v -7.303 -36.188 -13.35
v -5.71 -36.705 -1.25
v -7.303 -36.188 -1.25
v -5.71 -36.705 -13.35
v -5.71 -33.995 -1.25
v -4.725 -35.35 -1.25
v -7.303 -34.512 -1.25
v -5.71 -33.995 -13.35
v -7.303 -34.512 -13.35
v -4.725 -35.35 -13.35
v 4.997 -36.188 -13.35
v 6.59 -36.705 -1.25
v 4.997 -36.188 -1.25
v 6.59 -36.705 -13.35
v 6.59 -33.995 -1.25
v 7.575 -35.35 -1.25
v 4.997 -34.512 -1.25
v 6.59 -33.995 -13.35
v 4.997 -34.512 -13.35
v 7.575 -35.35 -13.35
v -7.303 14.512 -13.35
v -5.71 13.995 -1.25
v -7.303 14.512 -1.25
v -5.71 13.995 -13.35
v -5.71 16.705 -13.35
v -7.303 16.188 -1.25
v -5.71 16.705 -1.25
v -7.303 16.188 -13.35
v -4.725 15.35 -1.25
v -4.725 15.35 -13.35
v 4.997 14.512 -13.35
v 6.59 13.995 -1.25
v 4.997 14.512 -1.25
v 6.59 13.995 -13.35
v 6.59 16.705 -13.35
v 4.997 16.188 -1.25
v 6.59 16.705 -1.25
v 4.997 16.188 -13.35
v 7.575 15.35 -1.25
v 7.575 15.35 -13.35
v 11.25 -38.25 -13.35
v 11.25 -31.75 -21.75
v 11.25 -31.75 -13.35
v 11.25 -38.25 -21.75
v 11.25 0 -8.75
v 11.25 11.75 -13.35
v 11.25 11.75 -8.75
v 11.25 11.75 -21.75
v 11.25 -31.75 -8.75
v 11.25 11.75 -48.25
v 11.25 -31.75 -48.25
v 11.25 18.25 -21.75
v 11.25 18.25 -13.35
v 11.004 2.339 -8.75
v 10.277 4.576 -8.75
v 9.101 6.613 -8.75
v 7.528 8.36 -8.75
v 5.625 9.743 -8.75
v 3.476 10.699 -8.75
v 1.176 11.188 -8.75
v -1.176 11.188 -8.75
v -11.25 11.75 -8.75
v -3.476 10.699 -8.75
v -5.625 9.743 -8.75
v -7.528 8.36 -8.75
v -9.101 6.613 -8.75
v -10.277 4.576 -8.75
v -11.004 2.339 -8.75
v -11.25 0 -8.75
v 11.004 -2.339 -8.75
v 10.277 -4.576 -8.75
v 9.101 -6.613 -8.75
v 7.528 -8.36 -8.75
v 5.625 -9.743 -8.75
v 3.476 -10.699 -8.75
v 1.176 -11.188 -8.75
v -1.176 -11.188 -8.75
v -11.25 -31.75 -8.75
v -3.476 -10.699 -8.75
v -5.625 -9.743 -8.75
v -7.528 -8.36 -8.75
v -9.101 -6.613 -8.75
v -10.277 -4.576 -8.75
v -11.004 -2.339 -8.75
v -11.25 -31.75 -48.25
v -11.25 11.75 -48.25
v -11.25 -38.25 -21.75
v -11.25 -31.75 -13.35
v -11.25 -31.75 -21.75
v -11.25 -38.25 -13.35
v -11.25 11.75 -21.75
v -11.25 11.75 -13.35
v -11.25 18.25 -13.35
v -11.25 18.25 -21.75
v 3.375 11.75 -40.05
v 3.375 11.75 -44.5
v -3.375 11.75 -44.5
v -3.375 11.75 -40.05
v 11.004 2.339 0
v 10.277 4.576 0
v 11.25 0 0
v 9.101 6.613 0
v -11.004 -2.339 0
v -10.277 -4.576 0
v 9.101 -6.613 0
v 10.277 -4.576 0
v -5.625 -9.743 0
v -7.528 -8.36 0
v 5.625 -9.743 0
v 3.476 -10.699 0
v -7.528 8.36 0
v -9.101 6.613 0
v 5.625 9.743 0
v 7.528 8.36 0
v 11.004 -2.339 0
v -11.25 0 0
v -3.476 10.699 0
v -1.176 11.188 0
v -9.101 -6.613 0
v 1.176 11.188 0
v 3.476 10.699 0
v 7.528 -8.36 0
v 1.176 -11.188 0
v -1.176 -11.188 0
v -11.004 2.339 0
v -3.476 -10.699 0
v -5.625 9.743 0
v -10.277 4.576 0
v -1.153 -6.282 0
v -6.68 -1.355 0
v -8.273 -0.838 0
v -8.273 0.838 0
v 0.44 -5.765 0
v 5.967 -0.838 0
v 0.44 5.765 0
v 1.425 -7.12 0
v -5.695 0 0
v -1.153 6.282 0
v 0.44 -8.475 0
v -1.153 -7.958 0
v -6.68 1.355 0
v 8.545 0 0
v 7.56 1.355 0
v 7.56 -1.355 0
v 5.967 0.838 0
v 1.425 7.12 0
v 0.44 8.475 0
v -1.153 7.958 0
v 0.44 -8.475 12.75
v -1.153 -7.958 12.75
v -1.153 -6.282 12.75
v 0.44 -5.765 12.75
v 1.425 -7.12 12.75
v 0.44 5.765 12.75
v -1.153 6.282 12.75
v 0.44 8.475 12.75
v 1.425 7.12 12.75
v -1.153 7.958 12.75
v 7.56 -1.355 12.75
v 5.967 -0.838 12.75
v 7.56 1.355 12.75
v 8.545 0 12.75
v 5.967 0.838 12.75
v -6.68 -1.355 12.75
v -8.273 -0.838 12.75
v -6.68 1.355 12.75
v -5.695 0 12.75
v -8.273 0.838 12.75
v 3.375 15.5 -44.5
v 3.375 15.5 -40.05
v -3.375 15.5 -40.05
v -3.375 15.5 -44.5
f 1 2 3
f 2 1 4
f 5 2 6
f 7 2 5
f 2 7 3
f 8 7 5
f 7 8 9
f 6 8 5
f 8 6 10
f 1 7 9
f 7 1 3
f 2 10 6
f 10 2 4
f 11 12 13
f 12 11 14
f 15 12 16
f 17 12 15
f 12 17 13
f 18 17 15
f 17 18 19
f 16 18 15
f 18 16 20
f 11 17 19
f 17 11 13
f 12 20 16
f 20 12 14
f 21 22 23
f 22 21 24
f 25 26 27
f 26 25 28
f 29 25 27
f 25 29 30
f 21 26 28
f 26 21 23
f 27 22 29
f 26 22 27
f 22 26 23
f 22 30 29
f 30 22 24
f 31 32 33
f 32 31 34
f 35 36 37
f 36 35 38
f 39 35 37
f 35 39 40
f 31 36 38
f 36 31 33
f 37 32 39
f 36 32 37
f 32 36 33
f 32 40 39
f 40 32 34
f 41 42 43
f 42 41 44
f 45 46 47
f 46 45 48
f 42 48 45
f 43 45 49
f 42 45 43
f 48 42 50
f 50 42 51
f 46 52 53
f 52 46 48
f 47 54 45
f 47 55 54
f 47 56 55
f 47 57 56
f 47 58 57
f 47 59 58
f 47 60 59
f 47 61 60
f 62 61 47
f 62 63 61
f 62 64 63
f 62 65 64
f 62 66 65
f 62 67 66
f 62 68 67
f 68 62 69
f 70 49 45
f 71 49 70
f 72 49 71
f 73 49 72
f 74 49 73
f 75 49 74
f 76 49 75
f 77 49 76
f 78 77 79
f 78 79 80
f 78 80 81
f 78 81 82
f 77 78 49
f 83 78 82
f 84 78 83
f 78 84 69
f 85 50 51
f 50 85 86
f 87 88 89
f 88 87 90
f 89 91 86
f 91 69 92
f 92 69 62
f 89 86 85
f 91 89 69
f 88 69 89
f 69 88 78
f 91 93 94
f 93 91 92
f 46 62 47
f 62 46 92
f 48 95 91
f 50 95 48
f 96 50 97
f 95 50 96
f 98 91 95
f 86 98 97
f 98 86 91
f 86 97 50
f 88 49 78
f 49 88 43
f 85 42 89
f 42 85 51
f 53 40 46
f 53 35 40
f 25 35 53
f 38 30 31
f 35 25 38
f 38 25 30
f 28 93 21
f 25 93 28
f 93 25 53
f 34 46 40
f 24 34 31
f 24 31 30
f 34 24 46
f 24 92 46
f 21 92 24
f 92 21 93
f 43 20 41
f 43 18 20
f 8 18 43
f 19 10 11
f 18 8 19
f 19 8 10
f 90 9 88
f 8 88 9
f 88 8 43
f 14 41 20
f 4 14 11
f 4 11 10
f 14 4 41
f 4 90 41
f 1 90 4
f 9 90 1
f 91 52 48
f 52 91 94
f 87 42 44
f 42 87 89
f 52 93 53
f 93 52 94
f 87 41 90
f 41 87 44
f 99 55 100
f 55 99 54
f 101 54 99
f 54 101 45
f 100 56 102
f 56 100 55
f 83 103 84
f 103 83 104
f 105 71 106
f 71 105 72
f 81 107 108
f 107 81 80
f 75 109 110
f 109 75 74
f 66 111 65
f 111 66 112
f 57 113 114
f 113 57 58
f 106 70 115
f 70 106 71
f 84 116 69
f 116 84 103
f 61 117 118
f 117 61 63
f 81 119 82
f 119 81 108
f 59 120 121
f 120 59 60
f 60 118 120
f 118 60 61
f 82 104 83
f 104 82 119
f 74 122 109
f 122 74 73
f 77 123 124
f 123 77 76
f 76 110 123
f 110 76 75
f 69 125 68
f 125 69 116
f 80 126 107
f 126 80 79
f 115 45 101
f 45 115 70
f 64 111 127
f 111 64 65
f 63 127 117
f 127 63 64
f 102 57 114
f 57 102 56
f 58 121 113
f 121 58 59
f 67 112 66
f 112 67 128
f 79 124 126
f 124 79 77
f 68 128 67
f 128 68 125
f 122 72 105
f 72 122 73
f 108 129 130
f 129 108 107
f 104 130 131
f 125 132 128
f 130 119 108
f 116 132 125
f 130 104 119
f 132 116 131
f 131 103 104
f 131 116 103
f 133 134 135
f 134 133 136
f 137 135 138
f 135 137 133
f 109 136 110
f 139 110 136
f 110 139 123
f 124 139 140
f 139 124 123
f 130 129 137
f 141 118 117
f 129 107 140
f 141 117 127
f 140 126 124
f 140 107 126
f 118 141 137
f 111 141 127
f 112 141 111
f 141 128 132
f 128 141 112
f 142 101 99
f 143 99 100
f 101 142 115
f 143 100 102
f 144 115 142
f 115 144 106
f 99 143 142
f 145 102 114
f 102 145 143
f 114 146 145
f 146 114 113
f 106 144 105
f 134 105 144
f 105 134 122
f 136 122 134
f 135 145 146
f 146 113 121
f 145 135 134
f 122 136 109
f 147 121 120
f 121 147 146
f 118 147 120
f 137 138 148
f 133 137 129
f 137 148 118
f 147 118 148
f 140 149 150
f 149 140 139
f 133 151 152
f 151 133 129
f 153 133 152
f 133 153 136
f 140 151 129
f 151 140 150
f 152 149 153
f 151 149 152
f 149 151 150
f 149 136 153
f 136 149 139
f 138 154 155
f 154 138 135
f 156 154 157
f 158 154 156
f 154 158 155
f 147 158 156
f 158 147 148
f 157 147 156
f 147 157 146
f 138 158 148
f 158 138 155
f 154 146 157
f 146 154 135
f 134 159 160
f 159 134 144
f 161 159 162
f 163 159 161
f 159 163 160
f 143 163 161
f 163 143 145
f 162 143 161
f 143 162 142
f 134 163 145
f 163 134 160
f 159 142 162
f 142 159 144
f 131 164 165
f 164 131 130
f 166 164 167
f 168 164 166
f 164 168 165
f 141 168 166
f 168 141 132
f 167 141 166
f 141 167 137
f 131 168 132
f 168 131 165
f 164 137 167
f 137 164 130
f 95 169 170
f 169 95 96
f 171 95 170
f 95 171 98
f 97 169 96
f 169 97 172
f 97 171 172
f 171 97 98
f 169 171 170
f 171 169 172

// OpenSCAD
//When calling this module, use toleranceMotor(boolean,boolean); The first boolean determines the bolt direction(true is up, false is down) and the second determines where the module is centered (true centers at the hub, false centers at the motor mount)



//basic motor shape
height=38;
length=42;
thickness=21;

//wings for mounting
wingsheight=5.5;
wingslength=55;
wingsdist=26.5;
boltheadheight=1.4;

//cylinder on top of motor
cylinderheight=(46-38);
cylinderdiam=21;
cylinderdist=31;

//all bolts
boltheight=13.5;
boltdiam=2.1;

//body bolts
boltdist=4.35;

//cylinder bolts
cylboltdist2=3.5;
cylboltdist=7.12;

//hub for wires
hubheight=3.7;
hubwidth=6;
hublength=3;
hubdist=3;

//THIS IS THE TOLERANCE, THIS IS PROBABLY THE ONLY THING YOU WILL NEED TO ADJUST, IF THE HOLES ARE TOO SMALL, RAISE TOLERANCE, IF THEY ARE TOO BIG, LOWER TOLERANCE. IF THE HOLES DON'T LINE UP, THEN START CHANGING OTHER DIMENSIONS.
tolerance=.75;





//defining a bolt
module bolt()
{
	cylinder(boltheight+tolerance, (boltdiam+tolerance)/2, (boltdiam+tolerance)/2, 0);
}

module bodyBolts(boltPlacementZ){
		translate([boltdist,-boltdist,boltPlacementZ])
		{
			bolt();
		}
		
		translate([(thickness-boltdist),-boltdist,boltPlacementZ])
		{
			bolt();
		}

		translate([boltdist,(length+boltdist),boltPlacementZ])
		{
			bolt();
		}
		
		translate([(thickness-boltdist),(length+boltdist),boltPlacementZ])
		{
			bolt();
		}
}

module motorBlock(boltsUp=true){
	union()
	{
//basic motor shape
		translate([-tolerance, -tolerance, -tolerance])
		{
			cube([thickness+tolerance*2, length+tolerance*2, height+tolerance*2]);
		}

//wings for mounting
		translate([-tolerance, (-tolerance+((length-wingslength)/2)), wingsdist-tolerance])
		{
			cube([thickness+tolerance*2, wingslength+tolerance*2, wingsheight+tolerance*2+boltheadheight]);
		}

//cylinder on top of motor
		translate([cylinderdiam/2,cylinderdist,height])
		{
			cylinder(cylinderheight+tolerance*2, cylinderdiam/2+tolerance, cylinderdiam/2+tolerance, 0);

		}

//body bolts

		if(boltsUp==true){
			bodyBolts(wingsdist+wingsheight);
		}else{
			bodyBolts(wingsdist-boltheight);
		}
		
//cylinder bolts
		translate([thickness/2,cylinderdist-cylboltdist,(height+cylinderheight)])
		{
			bolt();
		}

		translate([thickness/2,cylinderdist+cylboltdist,(height+cylinderheight)])
		{
			bolt();
		}

		translate([thickness/2+cylboltdist,cylinderdist,(height+cylinderheight)])
		{
			bolt();
		}

		translate([thickness/2-cylboltdist,cylinderdist,(height+cylinderheight)])
		{
			bolt();
		}

//hub for wires
		translate([(thickness-(hubwidth+tolerance))/2,(length+tolerance),hubdist])
		{
			cube([hubwidth+tolerance,hublength+tolerance,hubheight+tolerance]);
		}
	}
}



//making the motor
module toleranceMotor(boltsUp=true,hornCentered=false)
{
	if(hornCentered==true){
		translate([-thickness/2,-cylinderdist,-(height+cylinderheight)-tolerance*2])
		{
			motorBlock(boltsUp);
		}
	}else{
		if(boltsUp == true){
			translate([tolerance,-length-tolerance,(-height+(height-wingsdist-wingsheight-tolerance*3))])
			{	
				motorBlock(boltsUp);
			}
		}else{
			translate([tolerance,-length-tolerance,(-height+(height-wingsdist)+tolerance)])
			{	
				motorBlock(boltsUp);
			}
		}
	}

}


toleranceMotor(true,true);
